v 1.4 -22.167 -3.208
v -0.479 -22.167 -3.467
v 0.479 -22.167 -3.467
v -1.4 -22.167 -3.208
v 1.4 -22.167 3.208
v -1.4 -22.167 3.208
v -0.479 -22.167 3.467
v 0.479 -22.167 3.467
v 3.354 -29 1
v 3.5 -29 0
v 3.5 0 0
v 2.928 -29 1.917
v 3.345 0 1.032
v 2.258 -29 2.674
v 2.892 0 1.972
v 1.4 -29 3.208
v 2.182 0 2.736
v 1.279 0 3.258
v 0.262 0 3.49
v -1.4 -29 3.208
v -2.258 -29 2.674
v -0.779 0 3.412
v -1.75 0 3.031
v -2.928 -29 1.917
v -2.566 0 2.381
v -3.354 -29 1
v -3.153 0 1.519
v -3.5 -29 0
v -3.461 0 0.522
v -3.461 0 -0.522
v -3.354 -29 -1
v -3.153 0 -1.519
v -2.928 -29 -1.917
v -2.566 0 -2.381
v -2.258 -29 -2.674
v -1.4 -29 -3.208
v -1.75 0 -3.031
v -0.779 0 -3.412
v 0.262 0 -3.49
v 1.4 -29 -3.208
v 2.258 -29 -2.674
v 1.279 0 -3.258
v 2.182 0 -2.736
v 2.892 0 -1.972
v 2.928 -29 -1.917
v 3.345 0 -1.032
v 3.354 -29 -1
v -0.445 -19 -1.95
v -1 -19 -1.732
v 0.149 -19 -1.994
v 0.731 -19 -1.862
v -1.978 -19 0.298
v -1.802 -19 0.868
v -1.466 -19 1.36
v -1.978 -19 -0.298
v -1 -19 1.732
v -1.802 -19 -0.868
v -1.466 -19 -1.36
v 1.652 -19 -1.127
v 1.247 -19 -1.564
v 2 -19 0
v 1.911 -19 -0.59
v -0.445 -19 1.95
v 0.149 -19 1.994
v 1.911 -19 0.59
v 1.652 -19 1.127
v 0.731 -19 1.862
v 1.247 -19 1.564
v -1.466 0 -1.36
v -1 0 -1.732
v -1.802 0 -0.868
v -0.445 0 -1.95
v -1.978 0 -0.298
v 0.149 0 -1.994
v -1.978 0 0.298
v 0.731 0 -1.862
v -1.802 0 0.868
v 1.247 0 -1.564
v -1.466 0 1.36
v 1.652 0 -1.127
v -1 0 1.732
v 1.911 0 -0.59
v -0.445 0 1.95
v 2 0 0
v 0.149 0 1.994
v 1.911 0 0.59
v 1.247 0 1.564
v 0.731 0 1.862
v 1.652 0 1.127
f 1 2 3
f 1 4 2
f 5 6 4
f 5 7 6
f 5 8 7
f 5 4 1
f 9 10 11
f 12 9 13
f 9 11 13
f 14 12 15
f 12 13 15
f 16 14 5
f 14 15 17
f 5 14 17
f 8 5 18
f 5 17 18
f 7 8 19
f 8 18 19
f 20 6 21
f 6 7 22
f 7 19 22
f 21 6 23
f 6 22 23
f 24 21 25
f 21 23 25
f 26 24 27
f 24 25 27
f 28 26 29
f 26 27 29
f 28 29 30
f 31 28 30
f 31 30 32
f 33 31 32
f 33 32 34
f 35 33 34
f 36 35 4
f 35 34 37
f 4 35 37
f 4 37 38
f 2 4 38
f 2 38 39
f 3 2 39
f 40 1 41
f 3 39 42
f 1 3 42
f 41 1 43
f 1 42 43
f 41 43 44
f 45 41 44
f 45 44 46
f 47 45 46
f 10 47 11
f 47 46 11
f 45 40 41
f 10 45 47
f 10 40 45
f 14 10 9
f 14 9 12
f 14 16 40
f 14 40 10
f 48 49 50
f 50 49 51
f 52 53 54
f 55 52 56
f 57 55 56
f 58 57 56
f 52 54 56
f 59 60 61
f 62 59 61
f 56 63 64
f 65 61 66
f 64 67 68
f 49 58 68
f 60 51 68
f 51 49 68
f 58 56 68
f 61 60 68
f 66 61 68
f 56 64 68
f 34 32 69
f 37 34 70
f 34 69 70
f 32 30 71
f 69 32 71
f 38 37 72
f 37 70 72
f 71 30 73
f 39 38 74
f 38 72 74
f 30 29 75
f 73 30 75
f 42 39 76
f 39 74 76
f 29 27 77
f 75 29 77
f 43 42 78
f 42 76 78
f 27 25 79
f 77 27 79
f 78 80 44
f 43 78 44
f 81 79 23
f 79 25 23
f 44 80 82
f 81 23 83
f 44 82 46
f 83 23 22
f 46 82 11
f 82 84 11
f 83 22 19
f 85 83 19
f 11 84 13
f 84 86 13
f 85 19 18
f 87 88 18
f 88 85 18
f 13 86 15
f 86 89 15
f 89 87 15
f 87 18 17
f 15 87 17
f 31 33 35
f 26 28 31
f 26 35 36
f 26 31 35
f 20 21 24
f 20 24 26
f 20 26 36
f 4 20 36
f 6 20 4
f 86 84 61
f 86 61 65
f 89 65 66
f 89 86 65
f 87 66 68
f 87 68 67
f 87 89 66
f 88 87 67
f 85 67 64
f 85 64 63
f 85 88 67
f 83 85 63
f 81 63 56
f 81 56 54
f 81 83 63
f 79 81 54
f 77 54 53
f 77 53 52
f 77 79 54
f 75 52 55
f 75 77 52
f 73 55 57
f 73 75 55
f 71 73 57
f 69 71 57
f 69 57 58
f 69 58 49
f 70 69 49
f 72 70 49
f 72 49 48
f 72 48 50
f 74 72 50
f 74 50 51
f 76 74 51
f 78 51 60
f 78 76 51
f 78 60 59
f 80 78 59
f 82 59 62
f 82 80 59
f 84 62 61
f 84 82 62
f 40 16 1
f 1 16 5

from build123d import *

# Parameters (mm, degrees)
F1_R     = 3.5
F2_DEPTH = 29
F0_R     = 2
F3_DEPTH = 19
F4_W     = 2.8
F4_H     = 7.9
F5_DEPTH = 12.5


with BuildPart() as f2:
    # F1 (on Front) → F2 (new body)
    with BuildSketch(Plane.XZ):
        Circle(F1_R)
    extrude(amount=F2_DEPTH)

    # F0 (on Front) → F3 (cut)
    with BuildSketch(Plane.XZ):
        Circle(F0_R)
    extrude(amount=F3_DEPTH, mode=Mode.SUBTRACT)

    # F4 (on Top) → F5 (cut, symmetric)
    with BuildSketch(Plane.XY):
        with Locations((0, -26.117409)):
            Rectangle(F4_W, F4_H)
    extrude(amount=F5_DEPTH, both=True, mode=Mode.SUBTRACT)


solid = f2.part
